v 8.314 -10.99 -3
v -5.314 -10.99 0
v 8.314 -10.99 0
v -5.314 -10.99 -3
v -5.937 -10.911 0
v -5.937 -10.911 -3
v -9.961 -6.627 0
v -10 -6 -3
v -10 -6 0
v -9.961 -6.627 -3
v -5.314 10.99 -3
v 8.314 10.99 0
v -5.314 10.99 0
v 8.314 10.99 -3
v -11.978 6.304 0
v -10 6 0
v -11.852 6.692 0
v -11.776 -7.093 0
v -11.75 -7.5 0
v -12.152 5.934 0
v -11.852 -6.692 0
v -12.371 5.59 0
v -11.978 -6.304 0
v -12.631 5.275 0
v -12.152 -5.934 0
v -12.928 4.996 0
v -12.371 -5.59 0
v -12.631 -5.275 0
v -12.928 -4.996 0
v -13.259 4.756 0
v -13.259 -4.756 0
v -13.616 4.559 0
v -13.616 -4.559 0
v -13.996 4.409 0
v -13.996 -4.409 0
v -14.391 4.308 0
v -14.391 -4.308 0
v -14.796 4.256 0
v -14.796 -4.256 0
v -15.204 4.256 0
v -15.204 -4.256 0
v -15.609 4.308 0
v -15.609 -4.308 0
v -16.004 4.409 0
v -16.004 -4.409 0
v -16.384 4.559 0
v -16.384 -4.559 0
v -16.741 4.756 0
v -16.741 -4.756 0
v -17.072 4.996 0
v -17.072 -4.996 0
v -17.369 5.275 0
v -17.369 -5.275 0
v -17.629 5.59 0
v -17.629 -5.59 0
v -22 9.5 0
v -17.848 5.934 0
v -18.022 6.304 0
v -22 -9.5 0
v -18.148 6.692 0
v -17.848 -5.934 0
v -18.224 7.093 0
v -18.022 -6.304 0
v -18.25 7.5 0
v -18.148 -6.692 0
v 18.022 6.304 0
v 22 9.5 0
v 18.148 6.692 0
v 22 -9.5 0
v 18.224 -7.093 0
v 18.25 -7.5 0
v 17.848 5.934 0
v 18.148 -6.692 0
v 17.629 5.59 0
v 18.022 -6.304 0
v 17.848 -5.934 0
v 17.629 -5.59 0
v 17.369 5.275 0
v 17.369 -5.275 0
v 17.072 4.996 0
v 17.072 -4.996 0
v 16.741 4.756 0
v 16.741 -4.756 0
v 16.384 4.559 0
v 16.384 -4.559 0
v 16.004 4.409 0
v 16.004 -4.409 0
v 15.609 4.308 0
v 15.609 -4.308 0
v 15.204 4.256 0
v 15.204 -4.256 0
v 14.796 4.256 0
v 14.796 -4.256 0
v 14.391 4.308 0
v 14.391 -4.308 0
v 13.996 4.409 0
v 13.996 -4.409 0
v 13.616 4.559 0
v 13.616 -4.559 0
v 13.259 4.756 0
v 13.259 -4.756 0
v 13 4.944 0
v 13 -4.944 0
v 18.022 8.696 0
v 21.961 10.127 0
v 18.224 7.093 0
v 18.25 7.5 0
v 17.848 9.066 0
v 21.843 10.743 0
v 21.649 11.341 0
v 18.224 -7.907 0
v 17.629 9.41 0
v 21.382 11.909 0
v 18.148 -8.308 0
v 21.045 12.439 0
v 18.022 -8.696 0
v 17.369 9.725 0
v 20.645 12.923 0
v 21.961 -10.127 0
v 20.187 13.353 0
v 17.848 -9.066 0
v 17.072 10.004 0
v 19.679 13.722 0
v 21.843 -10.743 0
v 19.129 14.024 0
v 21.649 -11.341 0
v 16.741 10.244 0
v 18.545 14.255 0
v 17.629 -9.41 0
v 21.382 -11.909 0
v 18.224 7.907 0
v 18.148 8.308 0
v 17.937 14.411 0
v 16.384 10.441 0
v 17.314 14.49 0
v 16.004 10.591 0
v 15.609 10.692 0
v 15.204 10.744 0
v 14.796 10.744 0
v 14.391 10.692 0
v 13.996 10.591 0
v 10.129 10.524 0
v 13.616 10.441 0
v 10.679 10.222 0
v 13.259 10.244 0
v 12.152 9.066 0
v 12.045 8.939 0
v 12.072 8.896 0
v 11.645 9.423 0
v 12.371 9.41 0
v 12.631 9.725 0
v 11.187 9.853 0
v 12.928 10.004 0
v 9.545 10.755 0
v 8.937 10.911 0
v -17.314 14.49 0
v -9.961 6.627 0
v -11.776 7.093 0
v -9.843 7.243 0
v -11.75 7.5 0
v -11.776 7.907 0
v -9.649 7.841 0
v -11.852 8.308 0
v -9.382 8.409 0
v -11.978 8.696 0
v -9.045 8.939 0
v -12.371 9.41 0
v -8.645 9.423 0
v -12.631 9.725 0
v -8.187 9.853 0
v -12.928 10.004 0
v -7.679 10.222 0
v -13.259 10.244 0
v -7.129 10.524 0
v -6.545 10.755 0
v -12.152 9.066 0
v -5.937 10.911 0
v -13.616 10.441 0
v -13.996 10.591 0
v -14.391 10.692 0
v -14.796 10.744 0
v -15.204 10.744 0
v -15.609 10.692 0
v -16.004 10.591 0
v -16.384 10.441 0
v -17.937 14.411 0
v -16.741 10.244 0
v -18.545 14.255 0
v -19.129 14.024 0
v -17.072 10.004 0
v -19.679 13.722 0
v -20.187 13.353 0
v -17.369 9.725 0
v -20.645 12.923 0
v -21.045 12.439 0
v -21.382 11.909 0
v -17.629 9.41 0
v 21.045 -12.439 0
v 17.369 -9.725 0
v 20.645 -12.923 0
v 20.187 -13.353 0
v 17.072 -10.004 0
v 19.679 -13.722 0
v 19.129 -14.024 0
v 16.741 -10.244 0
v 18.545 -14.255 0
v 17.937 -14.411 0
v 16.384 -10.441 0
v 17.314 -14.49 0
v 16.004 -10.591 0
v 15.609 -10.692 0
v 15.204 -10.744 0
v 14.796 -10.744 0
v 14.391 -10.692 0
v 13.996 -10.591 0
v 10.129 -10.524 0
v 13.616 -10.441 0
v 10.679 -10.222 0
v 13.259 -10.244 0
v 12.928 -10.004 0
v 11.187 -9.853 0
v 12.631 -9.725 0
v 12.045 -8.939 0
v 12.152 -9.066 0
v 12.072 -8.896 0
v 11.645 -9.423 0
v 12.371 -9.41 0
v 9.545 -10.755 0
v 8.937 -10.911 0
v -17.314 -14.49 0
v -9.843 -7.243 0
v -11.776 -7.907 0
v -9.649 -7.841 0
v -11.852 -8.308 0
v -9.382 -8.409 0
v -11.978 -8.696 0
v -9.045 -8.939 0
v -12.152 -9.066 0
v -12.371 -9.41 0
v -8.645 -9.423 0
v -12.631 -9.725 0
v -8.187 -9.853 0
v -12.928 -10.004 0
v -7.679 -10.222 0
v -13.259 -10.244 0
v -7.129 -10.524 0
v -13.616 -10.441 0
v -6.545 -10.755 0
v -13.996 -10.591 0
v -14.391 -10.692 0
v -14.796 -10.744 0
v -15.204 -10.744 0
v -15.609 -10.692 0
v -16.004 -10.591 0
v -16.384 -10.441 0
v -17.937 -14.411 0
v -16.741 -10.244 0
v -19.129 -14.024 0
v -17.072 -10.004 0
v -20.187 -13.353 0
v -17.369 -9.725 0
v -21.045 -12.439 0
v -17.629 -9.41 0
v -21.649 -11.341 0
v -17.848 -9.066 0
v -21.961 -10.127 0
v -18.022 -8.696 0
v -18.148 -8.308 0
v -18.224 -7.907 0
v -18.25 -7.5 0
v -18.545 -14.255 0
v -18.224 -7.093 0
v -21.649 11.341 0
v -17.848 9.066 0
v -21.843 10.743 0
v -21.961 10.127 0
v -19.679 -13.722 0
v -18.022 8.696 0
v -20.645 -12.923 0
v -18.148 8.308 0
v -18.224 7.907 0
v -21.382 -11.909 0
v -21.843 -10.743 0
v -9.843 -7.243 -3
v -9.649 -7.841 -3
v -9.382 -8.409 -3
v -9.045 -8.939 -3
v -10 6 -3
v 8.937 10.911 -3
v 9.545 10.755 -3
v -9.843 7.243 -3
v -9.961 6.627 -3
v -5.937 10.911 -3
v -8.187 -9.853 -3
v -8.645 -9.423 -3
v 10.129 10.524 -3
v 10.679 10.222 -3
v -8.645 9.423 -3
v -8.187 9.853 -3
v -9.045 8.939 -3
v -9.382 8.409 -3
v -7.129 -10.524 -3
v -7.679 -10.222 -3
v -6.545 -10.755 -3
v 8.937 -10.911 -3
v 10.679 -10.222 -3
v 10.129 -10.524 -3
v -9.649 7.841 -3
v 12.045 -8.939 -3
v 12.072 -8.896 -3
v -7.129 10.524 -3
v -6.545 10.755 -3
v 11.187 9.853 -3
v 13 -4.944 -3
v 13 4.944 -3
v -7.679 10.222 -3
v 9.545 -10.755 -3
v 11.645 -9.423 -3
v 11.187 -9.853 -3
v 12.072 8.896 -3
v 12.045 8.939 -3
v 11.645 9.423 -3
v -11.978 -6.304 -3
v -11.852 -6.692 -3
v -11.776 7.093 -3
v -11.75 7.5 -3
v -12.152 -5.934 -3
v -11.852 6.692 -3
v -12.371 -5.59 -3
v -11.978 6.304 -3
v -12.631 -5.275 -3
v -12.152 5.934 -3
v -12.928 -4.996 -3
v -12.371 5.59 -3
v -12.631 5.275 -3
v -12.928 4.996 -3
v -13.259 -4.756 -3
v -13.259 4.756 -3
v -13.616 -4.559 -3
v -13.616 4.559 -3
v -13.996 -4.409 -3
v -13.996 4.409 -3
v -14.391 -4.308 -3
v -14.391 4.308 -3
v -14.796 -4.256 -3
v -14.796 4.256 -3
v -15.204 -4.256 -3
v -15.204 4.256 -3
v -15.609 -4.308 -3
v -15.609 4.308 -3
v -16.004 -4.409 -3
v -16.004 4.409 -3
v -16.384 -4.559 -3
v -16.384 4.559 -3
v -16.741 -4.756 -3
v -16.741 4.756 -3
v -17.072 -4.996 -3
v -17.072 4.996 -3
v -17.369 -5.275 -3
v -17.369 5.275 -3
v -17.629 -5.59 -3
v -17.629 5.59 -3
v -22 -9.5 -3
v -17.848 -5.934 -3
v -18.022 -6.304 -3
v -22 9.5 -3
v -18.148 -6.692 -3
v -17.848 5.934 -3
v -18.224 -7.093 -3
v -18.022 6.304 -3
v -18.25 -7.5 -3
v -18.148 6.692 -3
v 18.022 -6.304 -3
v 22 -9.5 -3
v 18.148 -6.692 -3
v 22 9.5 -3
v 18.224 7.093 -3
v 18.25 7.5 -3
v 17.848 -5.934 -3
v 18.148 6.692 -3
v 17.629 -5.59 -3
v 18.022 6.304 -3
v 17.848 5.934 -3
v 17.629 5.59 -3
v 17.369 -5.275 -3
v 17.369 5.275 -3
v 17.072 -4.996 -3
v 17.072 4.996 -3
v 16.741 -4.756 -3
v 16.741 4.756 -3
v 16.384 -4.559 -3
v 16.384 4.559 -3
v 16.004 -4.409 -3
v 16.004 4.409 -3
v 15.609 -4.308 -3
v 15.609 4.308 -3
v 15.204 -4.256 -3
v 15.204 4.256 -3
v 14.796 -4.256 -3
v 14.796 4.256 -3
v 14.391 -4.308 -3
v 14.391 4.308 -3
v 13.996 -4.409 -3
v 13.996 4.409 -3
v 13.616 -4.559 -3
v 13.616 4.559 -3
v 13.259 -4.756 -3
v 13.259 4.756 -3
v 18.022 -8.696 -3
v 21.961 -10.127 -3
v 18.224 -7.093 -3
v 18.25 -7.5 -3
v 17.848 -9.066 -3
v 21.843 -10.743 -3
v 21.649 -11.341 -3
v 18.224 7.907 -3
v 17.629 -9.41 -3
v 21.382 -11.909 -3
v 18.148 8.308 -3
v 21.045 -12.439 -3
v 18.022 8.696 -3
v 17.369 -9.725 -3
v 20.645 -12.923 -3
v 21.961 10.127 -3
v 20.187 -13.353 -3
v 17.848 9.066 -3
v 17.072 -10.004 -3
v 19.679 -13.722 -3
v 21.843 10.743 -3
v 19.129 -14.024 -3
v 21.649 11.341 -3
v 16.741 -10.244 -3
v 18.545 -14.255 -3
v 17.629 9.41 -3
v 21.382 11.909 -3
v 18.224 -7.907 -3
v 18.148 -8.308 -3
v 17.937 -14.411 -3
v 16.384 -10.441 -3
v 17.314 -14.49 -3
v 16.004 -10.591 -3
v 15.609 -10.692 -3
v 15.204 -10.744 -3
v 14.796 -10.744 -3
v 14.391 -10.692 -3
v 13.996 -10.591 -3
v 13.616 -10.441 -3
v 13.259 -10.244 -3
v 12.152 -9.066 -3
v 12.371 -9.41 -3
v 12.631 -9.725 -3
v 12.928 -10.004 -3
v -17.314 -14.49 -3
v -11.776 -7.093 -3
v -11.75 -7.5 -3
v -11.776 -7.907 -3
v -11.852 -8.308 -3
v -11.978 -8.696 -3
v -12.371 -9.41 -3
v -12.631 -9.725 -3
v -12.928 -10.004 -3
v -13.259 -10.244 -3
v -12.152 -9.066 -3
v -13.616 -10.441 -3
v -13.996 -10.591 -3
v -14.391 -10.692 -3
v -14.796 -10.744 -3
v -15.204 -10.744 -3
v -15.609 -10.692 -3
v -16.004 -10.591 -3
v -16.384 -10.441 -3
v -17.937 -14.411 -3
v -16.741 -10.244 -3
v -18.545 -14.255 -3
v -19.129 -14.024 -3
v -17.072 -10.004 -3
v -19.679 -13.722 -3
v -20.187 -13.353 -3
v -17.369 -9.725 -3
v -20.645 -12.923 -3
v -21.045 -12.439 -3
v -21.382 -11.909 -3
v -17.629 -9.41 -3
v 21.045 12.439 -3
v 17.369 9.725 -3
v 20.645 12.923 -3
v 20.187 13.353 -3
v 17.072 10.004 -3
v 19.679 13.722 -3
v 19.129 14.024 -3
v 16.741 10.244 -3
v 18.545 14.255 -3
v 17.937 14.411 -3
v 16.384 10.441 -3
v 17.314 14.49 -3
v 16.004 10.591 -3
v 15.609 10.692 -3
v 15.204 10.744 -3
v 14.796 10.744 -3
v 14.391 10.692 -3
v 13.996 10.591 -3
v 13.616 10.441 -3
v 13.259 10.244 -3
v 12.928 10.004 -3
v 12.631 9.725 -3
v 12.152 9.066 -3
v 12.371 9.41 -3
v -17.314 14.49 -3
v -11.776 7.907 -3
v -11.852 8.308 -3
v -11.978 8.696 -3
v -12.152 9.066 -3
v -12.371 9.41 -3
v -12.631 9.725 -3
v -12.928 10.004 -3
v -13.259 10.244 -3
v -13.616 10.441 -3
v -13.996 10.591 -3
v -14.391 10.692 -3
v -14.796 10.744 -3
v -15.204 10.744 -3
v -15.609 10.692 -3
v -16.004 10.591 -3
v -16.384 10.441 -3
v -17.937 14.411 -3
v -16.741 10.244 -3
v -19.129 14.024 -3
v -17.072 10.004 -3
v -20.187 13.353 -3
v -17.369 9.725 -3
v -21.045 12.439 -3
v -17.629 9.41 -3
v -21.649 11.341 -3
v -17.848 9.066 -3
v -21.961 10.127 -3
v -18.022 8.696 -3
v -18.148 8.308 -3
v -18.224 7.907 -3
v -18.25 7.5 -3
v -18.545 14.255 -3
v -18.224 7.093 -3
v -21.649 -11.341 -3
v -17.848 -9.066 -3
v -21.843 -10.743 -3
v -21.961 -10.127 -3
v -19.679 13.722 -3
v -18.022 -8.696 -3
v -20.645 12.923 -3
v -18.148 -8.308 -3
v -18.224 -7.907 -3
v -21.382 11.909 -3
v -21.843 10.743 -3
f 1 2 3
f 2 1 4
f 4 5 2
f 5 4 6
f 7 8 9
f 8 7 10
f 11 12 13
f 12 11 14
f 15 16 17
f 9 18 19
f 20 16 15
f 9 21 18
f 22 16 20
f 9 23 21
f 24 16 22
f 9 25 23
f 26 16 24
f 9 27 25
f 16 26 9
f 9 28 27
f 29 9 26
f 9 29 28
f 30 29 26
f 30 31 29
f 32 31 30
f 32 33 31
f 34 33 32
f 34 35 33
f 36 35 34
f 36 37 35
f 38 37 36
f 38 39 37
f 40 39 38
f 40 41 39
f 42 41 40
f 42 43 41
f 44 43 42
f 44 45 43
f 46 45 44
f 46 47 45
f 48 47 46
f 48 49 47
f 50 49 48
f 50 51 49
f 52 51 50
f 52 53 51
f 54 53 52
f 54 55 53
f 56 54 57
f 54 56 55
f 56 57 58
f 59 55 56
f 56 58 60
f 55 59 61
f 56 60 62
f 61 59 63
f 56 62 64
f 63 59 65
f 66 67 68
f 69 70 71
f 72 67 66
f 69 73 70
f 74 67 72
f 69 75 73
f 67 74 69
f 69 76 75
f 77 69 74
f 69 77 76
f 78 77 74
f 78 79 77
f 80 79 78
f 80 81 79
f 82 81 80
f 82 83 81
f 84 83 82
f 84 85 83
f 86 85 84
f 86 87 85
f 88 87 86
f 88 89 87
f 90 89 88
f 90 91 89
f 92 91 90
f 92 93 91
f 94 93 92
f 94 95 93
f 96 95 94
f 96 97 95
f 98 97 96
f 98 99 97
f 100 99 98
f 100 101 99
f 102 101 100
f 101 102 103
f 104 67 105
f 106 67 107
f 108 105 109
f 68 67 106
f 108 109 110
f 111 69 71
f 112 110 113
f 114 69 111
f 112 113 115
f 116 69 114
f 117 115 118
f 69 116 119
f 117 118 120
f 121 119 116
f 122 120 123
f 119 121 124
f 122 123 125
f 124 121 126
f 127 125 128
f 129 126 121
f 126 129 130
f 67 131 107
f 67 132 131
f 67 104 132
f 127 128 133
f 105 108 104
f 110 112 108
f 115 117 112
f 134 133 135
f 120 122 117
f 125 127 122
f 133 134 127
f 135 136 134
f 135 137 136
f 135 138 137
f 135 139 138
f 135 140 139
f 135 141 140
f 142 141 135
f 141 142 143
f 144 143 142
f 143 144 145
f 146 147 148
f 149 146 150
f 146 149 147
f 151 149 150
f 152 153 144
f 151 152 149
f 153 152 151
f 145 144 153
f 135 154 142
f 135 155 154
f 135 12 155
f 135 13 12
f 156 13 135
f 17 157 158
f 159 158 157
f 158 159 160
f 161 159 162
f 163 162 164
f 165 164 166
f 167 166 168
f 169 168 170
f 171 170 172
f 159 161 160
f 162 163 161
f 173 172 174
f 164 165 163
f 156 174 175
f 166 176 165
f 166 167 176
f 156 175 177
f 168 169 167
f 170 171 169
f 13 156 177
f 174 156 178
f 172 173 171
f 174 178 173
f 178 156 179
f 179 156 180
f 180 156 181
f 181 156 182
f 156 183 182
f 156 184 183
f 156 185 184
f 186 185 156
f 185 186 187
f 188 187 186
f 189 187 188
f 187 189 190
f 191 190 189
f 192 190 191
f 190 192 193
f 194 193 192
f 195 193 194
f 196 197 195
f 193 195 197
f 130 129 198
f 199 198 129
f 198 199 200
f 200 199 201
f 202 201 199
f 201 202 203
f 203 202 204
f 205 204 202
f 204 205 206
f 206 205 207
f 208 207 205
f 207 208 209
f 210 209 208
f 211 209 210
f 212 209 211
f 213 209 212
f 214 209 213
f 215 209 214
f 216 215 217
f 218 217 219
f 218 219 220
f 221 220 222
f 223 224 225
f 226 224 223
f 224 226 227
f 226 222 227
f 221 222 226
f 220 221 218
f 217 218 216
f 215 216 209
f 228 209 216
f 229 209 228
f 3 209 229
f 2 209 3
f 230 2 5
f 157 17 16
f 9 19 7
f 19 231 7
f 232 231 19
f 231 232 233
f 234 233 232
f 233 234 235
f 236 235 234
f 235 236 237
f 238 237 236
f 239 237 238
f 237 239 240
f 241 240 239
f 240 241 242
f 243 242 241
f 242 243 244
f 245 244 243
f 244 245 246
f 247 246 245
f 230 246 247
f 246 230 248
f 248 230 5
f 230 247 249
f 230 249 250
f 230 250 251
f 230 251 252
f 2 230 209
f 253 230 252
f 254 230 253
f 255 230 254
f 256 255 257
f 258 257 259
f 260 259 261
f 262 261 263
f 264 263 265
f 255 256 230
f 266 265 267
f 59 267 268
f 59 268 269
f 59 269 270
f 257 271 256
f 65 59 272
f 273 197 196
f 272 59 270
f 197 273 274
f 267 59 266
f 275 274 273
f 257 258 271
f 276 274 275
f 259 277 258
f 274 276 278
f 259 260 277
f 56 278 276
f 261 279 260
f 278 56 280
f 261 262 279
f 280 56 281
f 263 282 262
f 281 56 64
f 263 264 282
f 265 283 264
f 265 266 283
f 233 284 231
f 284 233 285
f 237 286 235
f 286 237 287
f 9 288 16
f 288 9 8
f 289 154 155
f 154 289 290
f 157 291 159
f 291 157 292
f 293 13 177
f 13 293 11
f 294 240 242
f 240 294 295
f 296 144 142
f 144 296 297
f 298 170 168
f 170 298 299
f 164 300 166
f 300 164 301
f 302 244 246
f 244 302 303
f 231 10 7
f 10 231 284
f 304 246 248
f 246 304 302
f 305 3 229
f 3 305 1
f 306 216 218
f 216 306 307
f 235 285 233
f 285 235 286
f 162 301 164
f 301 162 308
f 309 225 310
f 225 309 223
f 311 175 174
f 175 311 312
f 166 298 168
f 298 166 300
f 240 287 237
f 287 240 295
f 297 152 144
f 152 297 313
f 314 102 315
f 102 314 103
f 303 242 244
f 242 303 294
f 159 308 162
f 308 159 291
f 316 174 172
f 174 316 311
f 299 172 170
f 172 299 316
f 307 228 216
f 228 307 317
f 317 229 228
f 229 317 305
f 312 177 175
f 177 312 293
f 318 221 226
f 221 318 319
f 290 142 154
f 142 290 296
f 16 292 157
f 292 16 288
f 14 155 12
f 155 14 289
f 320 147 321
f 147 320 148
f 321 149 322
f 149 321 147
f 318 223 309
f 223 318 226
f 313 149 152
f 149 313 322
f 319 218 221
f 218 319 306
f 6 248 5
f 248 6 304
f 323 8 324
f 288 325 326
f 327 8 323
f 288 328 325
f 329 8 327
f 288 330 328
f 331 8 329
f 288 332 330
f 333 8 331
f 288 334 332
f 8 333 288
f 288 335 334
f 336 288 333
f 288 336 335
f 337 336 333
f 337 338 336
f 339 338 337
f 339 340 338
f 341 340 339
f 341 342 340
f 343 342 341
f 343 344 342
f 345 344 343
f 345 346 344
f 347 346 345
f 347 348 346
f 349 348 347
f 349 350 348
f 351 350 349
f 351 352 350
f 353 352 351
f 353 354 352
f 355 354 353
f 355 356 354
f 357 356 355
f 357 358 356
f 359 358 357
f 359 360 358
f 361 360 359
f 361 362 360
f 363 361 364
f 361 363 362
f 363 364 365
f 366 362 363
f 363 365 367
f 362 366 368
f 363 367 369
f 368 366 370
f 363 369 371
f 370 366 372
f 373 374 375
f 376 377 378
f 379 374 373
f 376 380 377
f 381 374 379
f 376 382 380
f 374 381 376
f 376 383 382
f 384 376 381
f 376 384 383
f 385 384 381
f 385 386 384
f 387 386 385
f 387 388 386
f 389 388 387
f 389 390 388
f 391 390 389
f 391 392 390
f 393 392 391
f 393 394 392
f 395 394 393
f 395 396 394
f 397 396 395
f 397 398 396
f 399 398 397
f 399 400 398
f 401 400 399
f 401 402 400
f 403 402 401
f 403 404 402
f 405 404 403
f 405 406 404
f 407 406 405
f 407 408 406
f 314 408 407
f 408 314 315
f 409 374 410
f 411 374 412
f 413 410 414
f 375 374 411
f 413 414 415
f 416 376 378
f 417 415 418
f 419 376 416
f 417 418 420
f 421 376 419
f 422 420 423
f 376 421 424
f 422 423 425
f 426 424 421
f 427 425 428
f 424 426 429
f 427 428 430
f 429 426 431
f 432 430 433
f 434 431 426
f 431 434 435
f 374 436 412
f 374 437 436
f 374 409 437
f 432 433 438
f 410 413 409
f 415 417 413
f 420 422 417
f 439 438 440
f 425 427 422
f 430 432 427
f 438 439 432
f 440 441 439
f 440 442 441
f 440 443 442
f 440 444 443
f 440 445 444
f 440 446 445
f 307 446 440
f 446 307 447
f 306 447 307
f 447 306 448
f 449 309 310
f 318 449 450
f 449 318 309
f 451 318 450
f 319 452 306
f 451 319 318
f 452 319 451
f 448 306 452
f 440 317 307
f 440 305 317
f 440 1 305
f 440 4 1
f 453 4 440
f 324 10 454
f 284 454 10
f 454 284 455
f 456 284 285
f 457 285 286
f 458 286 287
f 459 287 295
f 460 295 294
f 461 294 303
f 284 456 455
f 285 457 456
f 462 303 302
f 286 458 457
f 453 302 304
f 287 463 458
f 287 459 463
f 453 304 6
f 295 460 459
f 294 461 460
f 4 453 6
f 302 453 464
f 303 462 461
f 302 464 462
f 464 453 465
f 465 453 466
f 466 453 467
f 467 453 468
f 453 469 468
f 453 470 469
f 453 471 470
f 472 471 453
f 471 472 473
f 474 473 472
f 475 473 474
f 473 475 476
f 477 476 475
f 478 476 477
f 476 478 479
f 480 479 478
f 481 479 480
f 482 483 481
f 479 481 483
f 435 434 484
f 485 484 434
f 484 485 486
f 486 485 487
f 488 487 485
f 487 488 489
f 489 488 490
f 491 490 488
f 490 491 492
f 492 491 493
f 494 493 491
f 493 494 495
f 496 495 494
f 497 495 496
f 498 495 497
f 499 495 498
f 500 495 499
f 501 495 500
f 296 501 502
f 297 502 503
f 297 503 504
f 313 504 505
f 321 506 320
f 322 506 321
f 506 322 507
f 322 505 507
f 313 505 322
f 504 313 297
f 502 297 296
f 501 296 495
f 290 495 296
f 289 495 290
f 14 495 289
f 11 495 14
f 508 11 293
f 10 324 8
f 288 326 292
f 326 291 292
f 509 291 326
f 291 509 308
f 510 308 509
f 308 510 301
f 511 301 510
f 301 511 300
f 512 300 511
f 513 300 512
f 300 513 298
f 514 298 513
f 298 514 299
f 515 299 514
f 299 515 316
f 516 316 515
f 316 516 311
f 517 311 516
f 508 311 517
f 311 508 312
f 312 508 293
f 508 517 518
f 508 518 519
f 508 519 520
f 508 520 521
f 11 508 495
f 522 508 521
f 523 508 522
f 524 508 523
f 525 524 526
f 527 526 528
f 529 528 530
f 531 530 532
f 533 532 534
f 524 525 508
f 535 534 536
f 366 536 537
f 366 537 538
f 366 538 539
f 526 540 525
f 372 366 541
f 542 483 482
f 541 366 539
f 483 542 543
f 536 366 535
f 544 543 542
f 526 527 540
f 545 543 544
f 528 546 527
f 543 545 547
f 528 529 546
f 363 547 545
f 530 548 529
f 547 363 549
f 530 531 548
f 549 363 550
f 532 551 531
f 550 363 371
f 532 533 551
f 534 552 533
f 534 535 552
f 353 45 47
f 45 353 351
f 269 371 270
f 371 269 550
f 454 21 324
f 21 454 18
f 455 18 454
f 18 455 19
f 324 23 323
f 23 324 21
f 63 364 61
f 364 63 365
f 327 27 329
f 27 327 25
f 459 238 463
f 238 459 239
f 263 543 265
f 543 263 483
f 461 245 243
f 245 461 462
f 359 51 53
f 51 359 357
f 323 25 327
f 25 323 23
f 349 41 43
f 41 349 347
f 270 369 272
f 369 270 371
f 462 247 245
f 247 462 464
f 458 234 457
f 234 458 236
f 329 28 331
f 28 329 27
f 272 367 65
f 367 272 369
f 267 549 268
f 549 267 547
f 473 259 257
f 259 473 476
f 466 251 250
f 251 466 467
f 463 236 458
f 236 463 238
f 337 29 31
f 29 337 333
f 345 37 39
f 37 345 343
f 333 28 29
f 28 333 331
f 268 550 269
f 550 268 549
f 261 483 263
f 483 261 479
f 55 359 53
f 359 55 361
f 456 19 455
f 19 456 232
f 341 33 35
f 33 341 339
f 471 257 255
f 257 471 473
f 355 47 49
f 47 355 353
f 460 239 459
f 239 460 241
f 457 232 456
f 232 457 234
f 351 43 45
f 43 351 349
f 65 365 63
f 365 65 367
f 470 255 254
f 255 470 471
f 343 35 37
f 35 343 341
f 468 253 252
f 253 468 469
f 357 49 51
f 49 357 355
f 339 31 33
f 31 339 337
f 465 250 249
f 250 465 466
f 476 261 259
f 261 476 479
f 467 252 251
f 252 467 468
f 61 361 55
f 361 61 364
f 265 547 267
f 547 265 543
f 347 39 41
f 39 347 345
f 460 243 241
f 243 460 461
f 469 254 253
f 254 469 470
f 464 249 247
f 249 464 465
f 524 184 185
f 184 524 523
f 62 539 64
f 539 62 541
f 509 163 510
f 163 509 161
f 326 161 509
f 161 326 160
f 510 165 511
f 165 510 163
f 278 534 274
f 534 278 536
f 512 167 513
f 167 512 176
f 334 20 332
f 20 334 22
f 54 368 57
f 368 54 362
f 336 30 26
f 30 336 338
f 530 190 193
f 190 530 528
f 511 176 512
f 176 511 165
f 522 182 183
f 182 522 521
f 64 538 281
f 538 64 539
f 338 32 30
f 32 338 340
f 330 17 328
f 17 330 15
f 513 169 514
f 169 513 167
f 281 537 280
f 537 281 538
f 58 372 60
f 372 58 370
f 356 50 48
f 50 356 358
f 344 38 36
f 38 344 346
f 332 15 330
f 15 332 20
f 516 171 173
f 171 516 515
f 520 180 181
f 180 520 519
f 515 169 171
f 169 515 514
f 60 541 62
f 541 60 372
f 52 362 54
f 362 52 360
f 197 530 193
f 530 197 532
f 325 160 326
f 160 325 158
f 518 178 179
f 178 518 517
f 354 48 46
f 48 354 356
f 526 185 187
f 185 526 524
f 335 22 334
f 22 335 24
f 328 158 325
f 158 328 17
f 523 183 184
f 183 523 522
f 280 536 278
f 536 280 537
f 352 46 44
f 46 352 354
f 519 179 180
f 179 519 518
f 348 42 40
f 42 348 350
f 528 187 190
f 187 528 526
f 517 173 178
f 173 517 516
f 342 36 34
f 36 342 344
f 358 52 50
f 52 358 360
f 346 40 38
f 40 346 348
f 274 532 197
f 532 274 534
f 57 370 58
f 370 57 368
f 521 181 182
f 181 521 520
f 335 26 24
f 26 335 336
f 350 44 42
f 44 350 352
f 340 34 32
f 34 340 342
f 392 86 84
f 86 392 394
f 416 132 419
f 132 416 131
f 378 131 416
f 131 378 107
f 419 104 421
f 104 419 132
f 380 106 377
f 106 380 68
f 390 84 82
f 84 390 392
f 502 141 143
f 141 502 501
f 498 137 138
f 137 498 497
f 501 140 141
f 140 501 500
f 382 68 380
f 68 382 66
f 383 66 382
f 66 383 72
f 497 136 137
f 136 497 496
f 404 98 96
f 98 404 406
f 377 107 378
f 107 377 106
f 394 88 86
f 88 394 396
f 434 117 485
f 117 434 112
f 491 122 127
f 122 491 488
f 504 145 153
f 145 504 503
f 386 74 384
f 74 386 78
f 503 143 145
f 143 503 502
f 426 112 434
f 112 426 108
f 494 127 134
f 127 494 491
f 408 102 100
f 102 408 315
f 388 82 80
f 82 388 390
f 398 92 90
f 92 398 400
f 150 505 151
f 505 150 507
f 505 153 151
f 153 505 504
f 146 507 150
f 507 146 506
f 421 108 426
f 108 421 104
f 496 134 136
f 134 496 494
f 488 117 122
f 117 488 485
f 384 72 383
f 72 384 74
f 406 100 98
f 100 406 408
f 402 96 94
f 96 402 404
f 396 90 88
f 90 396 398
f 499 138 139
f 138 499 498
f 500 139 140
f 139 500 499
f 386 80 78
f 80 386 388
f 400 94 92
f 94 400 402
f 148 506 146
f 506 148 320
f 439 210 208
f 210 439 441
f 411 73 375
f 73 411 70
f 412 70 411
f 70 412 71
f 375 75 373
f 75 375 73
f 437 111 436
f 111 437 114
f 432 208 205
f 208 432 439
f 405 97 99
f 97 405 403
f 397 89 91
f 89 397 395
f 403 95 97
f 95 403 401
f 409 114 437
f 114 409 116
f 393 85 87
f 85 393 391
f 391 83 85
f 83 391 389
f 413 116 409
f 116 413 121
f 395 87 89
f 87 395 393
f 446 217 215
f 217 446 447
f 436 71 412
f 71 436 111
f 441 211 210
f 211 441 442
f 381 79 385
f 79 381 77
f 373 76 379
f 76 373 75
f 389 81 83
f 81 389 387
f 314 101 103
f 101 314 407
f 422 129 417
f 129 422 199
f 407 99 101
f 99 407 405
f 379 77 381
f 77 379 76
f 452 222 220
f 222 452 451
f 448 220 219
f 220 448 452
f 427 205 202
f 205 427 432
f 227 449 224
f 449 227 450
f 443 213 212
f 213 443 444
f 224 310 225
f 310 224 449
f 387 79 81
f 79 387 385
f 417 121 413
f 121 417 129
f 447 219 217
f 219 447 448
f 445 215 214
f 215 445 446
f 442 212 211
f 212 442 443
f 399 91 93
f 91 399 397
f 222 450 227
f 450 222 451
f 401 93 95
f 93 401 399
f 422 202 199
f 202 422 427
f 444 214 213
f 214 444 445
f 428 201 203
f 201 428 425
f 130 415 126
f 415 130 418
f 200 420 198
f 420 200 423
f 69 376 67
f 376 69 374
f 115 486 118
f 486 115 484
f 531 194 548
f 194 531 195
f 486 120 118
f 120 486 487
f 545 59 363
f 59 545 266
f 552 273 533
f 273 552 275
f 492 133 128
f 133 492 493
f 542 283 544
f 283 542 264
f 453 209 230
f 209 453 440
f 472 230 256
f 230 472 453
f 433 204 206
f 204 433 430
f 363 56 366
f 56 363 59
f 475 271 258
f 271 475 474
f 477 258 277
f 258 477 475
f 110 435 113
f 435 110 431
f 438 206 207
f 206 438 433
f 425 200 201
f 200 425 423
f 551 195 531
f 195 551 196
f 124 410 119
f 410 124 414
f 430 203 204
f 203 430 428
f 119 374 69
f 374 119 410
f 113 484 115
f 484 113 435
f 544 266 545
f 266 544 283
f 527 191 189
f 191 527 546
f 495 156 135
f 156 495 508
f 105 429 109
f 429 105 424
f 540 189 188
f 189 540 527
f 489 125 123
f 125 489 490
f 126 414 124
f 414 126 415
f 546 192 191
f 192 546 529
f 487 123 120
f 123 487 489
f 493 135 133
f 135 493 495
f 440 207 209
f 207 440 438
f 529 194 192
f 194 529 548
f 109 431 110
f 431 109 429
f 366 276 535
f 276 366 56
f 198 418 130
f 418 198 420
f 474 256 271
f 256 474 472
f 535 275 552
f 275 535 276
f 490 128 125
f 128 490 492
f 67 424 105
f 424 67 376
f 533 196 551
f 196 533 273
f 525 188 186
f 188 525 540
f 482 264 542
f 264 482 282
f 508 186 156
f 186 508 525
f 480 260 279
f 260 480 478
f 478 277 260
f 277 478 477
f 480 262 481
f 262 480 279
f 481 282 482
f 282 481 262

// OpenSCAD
$fn = 50;


difference() {
	union() {
		*color(alpha = 1.0000000000, c = "gray") {
			translate(v = [0, 14, -3]) {
				linear_extrude(height = 2) {
					text(font = "Arial:style=Bold", halign = "center", size = 4.5000000000, text = "COMMENT description oobb_plate_shape_positive_type_3_depth_0_0_-3_pos_spacer_extra_3_thickness_3_width_2_height_0_0_-3_pos_plate", valign = "center");
				}
			}
		}
		translate(v = [0, 0, -3]) {
			hull() {
				translate(v = [-17.0000000000, 9.5000000000, 0]) {
					cylinder(h = 3, r = 5);
				}
				translate(v = [17.0000000000, 9.5000000000, 0]) {
					cylinder(h = 3, r = 5);
				}
				translate(v = [-17.0000000000, -9.5000000000, 0]) {
					cylinder(h = 3, r = 5);
				}
				translate(v = [17.0000000000, -9.5000000000, 0]) {
					cylinder(h = 3, r = 5);
				}
			}
		}
		*color(alpha = 1.0000000000, c = "gray") {
			translate(v = [0, 14, -3]) {
				linear_extrude(height = 2) {
					text(font = "Arial:style=Bold", halign = "center", size = 4.5000000000, text = "COMMENT description oobb_holes_shape_p_type_0_0_-3_pos_spacer_extra_3_thickness_3_width_2_height_0_0_-3_pos_plate_'left'_'right'_'top'_hole_sides_'left'_'right'_'top'_holes_true_both_holes", valign = "center");
				}
			}
		}
		*color(alpha = 1.0000000000, c = "gray") {
			translate(v = [0, 14, -3]) {
				rotate(a = [0, 0, 180]) {
					linear_extrude(height = 2) {
						text(font = "Arial:style=Bold", halign = "center", size = 4.5000000000, text = "COMMENT description oobb_wire_spacer_shape_0_0_-3_pos_spacer_extra_3_thickness_3_width_2_height_0_0_-3_pos_plate_0_0_180_rot", valign = "center");
					}
				}
			}
		}
	}
	union() {
		translate(v = [0, 0, -3]) {
			rotate(a = [0, 0, 180]) {
				difference() {
					union() {
						translate(v = [-1.5000000000, 0, 0]) {
							hull() {
								translate(v = [-6.5000000000, 6.0000000000, 0]) {
									cylinder(h = 3, r = 5);
								}
								translate(v = [6.5000000000, 6.0000000000, 0]) {
									cylinder(h = 3, r = 5);
								}
								translate(v = [-6.5000000000, -6.0000000000, 0]) {
									cylinder(h = 3, r = 5);
								}
								translate(v = [6.5000000000, -6.0000000000, 0]) {
									cylinder(h = 3, r = 5);
								}
							}
						}
					}
					union();
				}
			}
		}
		translate(v = [-15.0000000000, -7.5000000000, -50.0000000000]) {
			cylinder(h = 100, r = 3.2500000000);
		}
		translate(v = [-15.0000000000, 7.5000000000, -50.0000000000]) {
			cylinder(h = 100, r = 3.2500000000);
		}
		translate(v = [-15.0000000000, 7.5000000000, -50.0000000000]) {
			cylinder(h = 100, r = 3.2500000000);
		}
		translate(v = [0.0000000000, 7.5000000000, -50.0000000000]) {
			cylinder(h = 100, r = 3.2500000000);
		}
		translate(v = [15.0000000000, 7.5000000000, -50.0000000000]) {
			cylinder(h = 100, r = 3.2500000000);
		}
		translate(v = [-15.0000000000, -7.5000000000, -50.0000000000]) {
			cylinder(h = 100, r = 3.2500000000);
		}
		translate(v = [0.0000000000, -7.5000000000, -50.0000000000]) {
			cylinder(h = 100, r = 3.2500000000);
		}
		translate(v = [15.0000000000, -7.5000000000, -50.0000000000]) {
			cylinder(h = 100, r = 3.2500000000);
		}
	}
}
